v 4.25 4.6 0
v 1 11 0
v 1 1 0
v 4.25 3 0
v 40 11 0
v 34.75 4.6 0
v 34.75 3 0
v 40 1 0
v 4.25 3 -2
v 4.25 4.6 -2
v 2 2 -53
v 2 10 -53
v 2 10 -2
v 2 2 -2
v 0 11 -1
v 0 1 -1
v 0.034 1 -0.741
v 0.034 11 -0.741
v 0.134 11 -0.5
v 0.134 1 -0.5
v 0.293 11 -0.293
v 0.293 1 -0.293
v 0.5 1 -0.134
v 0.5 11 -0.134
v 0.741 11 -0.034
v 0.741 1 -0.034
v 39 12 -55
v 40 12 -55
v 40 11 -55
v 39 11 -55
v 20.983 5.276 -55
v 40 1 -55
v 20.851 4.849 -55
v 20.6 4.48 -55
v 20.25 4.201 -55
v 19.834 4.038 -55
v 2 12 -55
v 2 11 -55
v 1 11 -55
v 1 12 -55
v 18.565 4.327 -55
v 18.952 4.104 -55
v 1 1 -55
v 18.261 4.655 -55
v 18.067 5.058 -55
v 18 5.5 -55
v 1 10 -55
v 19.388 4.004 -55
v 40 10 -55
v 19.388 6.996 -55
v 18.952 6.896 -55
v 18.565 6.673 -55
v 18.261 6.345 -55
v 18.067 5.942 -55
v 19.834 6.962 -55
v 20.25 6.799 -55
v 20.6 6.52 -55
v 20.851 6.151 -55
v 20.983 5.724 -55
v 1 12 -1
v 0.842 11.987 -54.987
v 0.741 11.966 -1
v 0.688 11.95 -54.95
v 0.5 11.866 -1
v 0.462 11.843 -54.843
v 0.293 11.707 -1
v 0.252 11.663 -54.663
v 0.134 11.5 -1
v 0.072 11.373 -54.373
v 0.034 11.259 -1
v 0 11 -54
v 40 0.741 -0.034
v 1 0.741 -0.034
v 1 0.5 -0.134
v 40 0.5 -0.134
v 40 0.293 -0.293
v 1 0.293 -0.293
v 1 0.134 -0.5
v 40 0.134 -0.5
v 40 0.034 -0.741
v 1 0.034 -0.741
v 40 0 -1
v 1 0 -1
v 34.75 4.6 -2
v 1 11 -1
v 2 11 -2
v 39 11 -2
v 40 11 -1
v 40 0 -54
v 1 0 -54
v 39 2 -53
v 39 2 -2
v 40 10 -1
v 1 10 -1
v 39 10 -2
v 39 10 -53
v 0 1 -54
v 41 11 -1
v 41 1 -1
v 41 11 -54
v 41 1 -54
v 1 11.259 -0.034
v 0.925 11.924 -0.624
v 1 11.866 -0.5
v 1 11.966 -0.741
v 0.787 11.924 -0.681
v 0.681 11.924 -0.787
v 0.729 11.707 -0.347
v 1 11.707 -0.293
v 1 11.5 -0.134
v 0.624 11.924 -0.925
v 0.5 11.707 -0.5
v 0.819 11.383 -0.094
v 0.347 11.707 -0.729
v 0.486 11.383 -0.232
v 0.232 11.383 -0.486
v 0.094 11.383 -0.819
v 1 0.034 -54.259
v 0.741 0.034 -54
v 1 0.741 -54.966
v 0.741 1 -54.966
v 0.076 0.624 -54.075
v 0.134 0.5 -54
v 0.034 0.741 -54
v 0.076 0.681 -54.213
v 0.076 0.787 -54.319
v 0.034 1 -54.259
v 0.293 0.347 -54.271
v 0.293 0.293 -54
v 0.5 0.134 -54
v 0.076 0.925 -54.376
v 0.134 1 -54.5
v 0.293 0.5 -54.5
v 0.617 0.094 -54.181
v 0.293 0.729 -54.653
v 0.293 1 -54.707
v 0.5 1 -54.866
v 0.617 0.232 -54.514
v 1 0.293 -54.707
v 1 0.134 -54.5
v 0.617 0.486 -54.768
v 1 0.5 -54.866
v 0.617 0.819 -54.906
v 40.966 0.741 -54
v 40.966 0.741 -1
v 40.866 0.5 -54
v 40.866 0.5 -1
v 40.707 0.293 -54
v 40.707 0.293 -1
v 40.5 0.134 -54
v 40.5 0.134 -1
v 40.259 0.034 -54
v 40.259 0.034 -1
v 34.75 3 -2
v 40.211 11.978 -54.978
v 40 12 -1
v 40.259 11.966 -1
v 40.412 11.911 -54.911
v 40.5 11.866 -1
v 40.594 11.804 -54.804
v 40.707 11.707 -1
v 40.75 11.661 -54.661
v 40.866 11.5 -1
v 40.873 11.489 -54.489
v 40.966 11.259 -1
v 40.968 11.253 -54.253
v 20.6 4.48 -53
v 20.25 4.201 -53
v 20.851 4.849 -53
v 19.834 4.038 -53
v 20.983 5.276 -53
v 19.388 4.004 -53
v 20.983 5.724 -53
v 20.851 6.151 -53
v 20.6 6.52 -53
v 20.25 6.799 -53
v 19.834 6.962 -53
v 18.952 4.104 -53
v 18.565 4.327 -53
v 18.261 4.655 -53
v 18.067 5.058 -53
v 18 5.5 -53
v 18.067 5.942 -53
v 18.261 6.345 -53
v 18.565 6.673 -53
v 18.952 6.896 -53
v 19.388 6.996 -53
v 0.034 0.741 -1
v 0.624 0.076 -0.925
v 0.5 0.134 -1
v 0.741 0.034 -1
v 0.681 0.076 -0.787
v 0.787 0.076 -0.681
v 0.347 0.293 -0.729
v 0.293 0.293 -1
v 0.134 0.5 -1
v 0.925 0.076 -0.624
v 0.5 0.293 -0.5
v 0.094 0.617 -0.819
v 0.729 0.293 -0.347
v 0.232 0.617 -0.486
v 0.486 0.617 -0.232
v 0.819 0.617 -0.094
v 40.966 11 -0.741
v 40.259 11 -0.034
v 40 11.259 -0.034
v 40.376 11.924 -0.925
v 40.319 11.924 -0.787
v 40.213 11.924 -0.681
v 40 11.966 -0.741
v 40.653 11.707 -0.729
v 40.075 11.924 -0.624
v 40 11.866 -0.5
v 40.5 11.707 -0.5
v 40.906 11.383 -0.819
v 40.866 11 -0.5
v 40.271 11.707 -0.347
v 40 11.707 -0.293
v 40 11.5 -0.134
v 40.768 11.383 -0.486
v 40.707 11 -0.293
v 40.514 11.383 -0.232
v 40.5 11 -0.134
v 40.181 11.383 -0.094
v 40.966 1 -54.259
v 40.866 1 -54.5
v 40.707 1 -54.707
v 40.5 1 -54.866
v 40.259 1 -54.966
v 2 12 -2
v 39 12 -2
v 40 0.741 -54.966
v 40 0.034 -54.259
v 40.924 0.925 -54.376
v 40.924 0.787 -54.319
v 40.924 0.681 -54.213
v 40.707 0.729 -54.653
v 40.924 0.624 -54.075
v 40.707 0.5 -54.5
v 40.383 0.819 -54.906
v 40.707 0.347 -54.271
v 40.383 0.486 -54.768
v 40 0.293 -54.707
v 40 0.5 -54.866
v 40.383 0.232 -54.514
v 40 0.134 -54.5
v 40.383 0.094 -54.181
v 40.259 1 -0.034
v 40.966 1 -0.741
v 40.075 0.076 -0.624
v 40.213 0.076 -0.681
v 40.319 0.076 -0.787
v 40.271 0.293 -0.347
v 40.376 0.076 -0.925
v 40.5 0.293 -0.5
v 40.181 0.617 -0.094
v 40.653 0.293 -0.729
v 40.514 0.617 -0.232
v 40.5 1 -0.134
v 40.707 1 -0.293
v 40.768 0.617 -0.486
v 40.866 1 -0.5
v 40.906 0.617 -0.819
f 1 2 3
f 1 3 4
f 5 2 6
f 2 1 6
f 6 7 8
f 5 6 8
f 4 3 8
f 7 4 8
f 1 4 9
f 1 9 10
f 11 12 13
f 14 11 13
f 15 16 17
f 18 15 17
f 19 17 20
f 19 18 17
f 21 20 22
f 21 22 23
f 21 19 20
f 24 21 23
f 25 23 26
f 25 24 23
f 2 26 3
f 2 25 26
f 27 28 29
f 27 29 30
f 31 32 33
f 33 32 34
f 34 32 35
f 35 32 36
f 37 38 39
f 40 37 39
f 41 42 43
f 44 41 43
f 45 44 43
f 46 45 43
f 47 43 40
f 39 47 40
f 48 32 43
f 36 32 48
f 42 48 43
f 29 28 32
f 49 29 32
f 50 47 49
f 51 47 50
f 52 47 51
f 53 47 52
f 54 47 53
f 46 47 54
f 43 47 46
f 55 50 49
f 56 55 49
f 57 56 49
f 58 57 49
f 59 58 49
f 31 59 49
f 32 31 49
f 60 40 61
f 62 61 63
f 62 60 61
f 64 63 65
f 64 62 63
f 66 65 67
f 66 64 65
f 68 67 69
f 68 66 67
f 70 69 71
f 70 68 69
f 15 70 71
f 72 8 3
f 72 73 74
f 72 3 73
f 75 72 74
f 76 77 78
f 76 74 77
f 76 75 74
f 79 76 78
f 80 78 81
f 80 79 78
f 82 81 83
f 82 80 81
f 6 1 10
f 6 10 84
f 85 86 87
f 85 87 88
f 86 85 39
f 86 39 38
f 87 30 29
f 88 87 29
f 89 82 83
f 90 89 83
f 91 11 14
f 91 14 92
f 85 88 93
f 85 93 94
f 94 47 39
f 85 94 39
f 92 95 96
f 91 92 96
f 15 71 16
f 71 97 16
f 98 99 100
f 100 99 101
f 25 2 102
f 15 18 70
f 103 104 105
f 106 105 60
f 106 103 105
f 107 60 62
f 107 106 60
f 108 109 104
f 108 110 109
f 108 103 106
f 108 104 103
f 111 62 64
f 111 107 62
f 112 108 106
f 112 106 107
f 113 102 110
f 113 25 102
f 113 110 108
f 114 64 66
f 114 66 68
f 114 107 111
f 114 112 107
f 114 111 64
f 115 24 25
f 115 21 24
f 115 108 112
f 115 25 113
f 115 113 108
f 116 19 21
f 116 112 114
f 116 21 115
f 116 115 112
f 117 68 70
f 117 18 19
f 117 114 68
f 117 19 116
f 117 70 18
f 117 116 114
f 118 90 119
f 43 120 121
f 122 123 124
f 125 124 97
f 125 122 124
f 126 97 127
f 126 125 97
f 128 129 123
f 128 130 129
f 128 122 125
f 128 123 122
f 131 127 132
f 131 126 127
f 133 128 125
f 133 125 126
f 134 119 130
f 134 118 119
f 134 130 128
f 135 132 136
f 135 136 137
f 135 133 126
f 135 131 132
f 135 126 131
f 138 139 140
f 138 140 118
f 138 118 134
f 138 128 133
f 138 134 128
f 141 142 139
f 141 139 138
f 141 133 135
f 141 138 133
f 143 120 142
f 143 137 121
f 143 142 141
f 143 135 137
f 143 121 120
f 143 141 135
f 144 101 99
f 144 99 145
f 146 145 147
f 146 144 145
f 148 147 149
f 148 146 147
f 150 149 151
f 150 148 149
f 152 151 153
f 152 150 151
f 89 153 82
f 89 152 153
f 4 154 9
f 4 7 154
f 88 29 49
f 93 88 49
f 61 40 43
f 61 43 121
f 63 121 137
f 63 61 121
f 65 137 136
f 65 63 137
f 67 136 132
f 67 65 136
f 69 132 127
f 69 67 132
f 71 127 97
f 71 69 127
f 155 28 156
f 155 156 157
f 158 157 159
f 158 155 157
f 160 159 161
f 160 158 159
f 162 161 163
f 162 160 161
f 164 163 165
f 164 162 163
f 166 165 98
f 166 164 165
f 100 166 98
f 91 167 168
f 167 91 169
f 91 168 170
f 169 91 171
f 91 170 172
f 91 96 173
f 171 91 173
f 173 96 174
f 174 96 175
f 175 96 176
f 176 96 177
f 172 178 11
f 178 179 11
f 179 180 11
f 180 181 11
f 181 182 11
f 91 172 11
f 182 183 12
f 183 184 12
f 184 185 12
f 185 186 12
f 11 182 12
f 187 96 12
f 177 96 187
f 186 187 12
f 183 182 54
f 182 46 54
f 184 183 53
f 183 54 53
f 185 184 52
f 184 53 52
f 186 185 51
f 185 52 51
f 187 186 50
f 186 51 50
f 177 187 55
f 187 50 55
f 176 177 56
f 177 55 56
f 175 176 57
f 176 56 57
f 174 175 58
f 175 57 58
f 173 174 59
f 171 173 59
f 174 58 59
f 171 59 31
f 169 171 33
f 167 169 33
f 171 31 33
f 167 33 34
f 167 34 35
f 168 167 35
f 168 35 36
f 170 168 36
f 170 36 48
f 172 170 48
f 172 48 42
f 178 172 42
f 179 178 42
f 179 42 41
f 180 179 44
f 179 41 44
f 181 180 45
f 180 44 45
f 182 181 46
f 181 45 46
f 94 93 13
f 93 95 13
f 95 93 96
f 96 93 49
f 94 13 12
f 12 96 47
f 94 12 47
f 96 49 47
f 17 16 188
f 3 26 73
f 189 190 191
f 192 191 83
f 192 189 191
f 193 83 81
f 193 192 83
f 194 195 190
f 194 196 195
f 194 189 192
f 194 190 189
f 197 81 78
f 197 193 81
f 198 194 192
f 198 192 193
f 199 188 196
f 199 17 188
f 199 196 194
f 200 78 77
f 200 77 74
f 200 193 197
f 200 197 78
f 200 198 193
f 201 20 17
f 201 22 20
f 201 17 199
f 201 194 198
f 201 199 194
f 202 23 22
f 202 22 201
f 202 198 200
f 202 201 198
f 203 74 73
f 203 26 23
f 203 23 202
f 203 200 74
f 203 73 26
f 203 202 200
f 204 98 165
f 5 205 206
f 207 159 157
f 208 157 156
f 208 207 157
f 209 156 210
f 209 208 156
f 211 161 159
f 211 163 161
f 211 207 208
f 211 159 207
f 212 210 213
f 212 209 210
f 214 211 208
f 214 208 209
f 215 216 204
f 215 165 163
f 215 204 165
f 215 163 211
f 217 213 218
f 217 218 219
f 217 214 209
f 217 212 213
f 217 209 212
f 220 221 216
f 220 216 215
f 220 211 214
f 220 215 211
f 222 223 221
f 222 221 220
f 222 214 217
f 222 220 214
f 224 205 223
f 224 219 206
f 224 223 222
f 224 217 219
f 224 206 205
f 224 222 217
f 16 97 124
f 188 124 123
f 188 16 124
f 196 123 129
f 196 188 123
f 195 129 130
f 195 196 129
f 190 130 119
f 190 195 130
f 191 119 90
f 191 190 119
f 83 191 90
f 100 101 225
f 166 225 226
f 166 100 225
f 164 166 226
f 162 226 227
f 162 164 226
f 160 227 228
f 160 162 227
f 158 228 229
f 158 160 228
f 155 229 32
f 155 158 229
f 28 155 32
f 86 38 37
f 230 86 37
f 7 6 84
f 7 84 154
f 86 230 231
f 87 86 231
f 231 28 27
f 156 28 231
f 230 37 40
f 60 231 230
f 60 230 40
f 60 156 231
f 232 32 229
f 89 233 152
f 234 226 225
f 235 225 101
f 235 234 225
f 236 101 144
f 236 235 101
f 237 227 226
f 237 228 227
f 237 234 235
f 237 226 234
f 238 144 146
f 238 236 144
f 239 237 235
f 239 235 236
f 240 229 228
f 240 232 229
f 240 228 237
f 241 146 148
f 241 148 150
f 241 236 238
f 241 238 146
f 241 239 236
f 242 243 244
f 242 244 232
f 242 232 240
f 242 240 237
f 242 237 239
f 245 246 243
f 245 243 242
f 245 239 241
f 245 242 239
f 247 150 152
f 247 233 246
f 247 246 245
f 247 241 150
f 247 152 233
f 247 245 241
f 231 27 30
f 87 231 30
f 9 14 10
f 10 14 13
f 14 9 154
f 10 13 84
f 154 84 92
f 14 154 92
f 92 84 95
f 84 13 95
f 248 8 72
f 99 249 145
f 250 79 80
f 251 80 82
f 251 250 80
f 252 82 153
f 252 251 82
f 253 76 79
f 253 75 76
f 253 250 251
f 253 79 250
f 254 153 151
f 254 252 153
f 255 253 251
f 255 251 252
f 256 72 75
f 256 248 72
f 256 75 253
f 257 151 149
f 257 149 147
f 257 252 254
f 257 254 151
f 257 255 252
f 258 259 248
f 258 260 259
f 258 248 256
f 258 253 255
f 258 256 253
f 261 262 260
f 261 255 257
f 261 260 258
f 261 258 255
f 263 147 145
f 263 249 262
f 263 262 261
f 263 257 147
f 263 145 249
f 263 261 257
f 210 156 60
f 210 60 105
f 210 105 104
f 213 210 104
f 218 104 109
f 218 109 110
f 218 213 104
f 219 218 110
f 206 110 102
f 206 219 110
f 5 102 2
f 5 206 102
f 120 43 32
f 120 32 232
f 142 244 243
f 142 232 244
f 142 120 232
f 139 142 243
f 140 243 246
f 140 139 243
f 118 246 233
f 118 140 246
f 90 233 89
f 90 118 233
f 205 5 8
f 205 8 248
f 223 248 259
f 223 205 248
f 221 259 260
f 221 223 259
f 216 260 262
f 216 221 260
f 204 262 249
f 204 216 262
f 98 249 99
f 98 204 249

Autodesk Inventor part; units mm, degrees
ref_plane "YZ Plane" through (0, 0, 0) normal (1, 0, 0) x (0, 1, 0)
ref_plane "XZ Plane" through (0, 0, 0) normal (0, 1, 0) x (-1, 0, 0)
ref_plane "XY Plane" through (0, 0, 0) normal (0, 0, 1) x (1, 0, 0)
sketch "スケッチ1" plane through (0, 0, 0) normal (0, 1, 0) x (-1, 0, 0)
  line L0 (0, 0) -> (-41, 0)
  line L1 (-41, 0) -> (-41, -55)
  line L2 (-41, -55) -> (0, -55)
  line L3 (0, -55) -> (0, 0)
  dimension "d0" = 41
  dimension "d1" = 55
extrude "押し出し1" add sketch "スケッチ1" along normal blind 12
sketch "スケッチ3" plane through (0, 12, 0) normal (0, 1, 0) x (1, 0, 0)
  line L0 (2, 2) -> (39, 2)
  line L1 (39, 2) -> (39, 53)
  line L2 (39, 53) -> (2, 53)
  line L3 (2, 53) -> (2, 2)
  line L4 (0, 55) -> (0, 0) projected
  line L5 (0, 0) -> (41, 0) projected
  dimension "d4" = 37
  dimension "d5" = 51
  dimension "d6" = 2
  dimension "d7" = 2
extrude "押し出し2" cut sketch "スケッチ3" against normal blind 10
sketch "スケッチ4" plane through (0, 0, 0) normal (0, 0, 1) x (1, 0, 0)
  line L0 (4.25, 4.6) -> (34.75, 4.6)
  line L1 (34.75, 4.6) -> (34.75, 3)
  line L2 (34.75, 3) -> (4.25, 3)
  line L3 (4.25, 3) -> (4.25, 4.6)
  line L4 (0, 0) -> (41, 0) projected
  line L5 (0, 0) -> (0, 12) projected
  point P0 (4.25, 3.8)
  point P1 (19.5, 4.6)
  dimension "d10" = 30.5
  dimension "d11" = 1.6
  dimension "d12" = 3
  dimension "d14" = 19.5
extrude "押し出し3" cut sketch "スケッチ4" against normal blind 10
sketch "スケッチ5" plane through (41, 0, -55) normal (0, 0, -1) x (-1, 0, 0)
  circle A0 centre (21.5, 5.5) radius 1.5
  line L0 (41, 0) -> (41, 12) projected
  line L1 (0, 12) -> (41, 12) projected
  dimension "d17" = 3
  dimension "d18" = 19.5
  dimension "d19" = 6.5
extrude "押し出し4" cut sketch "スケッチ5" against normal blind 10
sketch "スケッチ7" plane through (41, 0, -55) normal (0, 0, -1) x (-1, 0, 0)
  line L0 (40, 11) -> (1, 11)
  line L1 (1, 11) -> (1, 10)
  line L2 (1, 10) -> (40, 10)
  line L3 (40, 10) -> (40, 11)
  line L4 (41, 0) -> (41, 12) projected
  line L5 (0, 12) -> (41, 12) projected
  point P0 (20.5, 10)
  dimension "d22" = 39
  dimension "d23" = 1
  dimension "d24" = 20.5
  dimension "d25" = 1
extrude "押し出し5" cut sketch "スケッチ7" against normal blind 54
sketch "スケッチ8" plane through (41, 0, -55) normal (0, 0, -1) x (-1, 0, 0)
  line L0 (39, 12) -> (2, 12)
  line L1 (2, 12) -> (2, 11)
  line L2 (2, 11) -> (39, 11)
  line L3 (39, 11) -> (39, 12)
  line L4 (41, 0) -> (41, 12) projected
  line L5 (0, 12) -> (41, 12) projected
  point P0 (20.5, 12)
  dimension "d28" = 37
  dimension "d29" = 1
  dimension "d30" = 20.5
  dimension "d31" = 0
extrude "押し出し6" cut sketch "スケッチ8" against normal blind 2
fillet "フィレット1" radius 1 11 edges at (0, 6, 0) (41, 6, 0) (20.5, 12, 0) (41, 12, -27.5) (20.5, 0, -55) (0, 6, -55) (0, 0, -27.5) (20.5, 0, 0) (41, 0, -27.5) (41, 6, -55) (0, 12, -27.5)
properties part number "case_basic"
